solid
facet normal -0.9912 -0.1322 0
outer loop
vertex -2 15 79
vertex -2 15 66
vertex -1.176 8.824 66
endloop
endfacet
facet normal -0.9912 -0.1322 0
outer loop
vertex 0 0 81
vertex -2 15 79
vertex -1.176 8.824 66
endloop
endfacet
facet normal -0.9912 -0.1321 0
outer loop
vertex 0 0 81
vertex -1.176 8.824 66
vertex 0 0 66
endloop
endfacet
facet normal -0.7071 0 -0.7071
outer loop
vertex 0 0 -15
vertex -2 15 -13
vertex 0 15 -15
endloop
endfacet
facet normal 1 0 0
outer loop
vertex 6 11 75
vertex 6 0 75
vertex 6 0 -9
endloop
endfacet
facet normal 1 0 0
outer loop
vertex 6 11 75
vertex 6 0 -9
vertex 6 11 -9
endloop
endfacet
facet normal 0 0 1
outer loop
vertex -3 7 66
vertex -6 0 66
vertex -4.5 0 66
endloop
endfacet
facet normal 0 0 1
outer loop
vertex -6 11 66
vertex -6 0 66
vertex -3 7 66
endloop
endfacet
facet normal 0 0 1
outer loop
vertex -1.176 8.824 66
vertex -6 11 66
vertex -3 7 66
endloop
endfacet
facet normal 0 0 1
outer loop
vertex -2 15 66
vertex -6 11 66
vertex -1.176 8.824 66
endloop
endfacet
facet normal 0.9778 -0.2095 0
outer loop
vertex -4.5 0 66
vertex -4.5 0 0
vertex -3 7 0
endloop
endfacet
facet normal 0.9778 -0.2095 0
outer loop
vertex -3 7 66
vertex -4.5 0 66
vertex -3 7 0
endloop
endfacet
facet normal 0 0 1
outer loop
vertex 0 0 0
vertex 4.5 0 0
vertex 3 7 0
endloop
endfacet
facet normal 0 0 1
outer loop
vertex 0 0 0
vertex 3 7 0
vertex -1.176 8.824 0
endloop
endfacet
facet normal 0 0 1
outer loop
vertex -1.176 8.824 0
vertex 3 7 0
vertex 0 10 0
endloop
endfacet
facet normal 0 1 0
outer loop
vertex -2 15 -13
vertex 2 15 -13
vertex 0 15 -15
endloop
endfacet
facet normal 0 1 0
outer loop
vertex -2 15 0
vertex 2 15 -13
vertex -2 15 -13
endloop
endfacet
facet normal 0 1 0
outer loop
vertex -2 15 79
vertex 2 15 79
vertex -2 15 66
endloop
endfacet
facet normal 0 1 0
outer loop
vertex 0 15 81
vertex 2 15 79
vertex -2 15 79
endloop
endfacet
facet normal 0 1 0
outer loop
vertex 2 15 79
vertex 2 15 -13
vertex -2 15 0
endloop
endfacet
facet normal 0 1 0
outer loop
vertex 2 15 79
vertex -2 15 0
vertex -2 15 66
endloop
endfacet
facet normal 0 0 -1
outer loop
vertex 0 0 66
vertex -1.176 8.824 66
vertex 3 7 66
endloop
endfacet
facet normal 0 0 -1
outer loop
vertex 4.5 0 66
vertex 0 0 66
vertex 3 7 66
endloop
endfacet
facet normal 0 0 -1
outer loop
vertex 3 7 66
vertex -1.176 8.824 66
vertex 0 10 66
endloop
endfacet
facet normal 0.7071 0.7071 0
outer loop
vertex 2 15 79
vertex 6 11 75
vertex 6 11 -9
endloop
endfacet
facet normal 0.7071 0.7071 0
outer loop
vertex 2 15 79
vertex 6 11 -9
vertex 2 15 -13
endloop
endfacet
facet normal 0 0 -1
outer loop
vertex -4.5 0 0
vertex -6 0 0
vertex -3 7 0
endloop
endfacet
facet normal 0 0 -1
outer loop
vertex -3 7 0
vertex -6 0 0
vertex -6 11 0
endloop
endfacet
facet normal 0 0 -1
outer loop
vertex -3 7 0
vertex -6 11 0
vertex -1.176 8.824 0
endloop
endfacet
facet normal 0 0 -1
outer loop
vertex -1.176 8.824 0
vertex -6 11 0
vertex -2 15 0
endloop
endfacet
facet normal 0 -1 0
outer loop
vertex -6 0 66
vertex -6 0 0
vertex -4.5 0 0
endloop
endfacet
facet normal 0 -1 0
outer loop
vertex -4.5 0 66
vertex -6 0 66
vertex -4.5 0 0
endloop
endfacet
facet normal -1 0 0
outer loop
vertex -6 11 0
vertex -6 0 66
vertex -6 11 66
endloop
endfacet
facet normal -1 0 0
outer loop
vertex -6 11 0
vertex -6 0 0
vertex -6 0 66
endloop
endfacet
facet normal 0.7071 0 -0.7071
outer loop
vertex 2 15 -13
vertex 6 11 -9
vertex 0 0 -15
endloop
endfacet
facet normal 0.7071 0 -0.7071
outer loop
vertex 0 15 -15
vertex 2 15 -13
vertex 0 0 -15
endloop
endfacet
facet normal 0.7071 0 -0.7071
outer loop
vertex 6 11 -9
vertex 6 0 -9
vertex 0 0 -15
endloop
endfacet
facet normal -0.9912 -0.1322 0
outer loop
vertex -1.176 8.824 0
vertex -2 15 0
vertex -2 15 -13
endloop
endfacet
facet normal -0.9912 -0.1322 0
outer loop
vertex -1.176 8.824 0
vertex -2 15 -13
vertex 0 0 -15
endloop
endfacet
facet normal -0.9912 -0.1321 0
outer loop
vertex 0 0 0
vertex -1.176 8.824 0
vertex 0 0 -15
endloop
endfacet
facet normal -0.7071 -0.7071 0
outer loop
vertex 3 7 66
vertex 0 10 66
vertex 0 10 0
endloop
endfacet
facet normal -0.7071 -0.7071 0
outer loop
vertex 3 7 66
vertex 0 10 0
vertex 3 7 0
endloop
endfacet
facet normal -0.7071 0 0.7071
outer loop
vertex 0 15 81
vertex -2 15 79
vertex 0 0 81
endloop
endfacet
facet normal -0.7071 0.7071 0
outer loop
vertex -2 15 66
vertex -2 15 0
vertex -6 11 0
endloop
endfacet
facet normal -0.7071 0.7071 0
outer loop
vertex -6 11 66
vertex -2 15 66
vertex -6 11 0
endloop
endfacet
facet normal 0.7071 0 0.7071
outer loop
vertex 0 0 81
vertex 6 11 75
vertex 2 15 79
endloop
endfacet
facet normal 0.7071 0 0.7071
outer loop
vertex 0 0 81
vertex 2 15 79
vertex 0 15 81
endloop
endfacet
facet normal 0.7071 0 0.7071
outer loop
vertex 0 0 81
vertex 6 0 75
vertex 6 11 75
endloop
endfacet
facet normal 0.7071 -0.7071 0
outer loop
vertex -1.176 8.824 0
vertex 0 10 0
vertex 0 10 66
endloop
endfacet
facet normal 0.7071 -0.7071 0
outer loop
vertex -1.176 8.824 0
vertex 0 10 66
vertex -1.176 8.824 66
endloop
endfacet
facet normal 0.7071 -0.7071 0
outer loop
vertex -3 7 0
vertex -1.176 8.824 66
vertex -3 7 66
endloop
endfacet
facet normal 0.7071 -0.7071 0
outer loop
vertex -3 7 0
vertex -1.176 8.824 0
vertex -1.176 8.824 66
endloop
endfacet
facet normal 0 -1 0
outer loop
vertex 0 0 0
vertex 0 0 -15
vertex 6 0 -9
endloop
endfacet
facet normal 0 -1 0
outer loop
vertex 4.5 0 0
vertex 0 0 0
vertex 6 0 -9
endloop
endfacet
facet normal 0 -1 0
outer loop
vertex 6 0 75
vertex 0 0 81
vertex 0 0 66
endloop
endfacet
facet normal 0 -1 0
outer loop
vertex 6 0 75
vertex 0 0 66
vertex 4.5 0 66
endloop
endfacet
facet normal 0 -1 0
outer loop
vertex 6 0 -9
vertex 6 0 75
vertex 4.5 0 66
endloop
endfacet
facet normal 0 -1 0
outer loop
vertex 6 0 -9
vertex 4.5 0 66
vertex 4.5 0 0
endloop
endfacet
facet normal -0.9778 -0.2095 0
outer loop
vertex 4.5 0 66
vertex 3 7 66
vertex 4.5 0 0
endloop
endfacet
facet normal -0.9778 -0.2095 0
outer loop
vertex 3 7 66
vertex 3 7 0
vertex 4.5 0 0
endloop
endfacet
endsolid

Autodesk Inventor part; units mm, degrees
ref_plane "YZ Plane" through (0, 0, 0) normal (1, 0, 0) x (0, 1, 0)
ref_plane "XZ Plane" through (0, 0, 0) normal (0, 1, 0) x (-1, 0, 0)
ref_plane "XY Plane" through (0, 0, 0) normal (0, 0, 1) x (1, 0, 0)
sketch "Sketch1" plane through (0, 0, 0) normal (0, 0, 1) x (1, 0, 0)
  line L0 (6, 0) -> (6, 11)
  line L1 (0, 15) -> (2, 15)
  line L2 (2, 15) -> (6, 11)
  line L3 (0, 10) -> (3, 7)
  line L4 (-6, 0) -> (-6, 11)
  line L5 (0, 15) -> (-2, 15)
  line L6 (-2, 15) -> (-6, 11)
  line L7 (0, 10) -> (-3, 7)
  line L8 (-4.5, 0) -> (-3, 7)
  line L9 (3, 7) -> (4.5, 0)
  line L10 (-6, 0) -> (-4.5, 0)
  line L11 (4.5, 0) -> (6, 0)
  point P0 (0, 0)
  dimension "d2" = 11
  dimension "d4" = 2
  dimension "d5" = 10
extrude "Extrusion1" add sketch "Sketch1" along normal blind 66
sketch "Sketch2" plane through (0, 0, 66) normal (0, 0, 1) x (1, 0, 0)
  line L0 (2, 15) -> (-2, 15) projected
  line L1 (0, 15) -> (2, 15)
  line L2 (6, 11) -> (2, 15) projected
  line L3 (4.5, 0) -> (6, 0) projected
  line L4 (0, 0) -> (6, 0)
  line L5 (6, 0) -> (6, 11) projected
  line L6 (6, 0) -> (6, 11)
  line L7 (6, 11) -> (2, 15)
  line L8 (0, 15) -> (-2, 15)
  line L9 (-2, 15) -> (0, 0)
extrude "Extrusion2" add sketch "Sketch2" along normal blind 15
sketch "Sketch5" plane through (0, 0, 0) normal (0, 0, -1) x (-1, 0, 0)
  line L0 (0, 0) -> (-6, 0) projected
  line L1 (-6, 0) -> (-6, 11) projected
  line L2 (-6, 11) -> (-2, 15) projected
  line L3 (-2, 15) -> (2, 15) projected
  line L4 (2, 15) -> (0, 0) projected
extrude "Extrusion4" add sketch "Sketch5" along normal blind 15
sketch "Sketch6" plane through (0, 0, 66) normal (0, -1, 0) x (1, 0, 0)
  line L0 (0, -66) -> (0, -81) projected
  line L1 (6, -81) -> (6, 15) projected
  line L2 (0, -81) -> (6, -81)
  line L3 (6, -81) -> (6, -75)
  line L4 (6, -75) -> (0, -81)
  line L5 (-2, -81) -> (2, -81) projected
  line L6 (0, -81) -> (-2, -81)
  line L7 (-2, -81) -> (-2, -79)
  line L8 (-2, -66) -> (-2, -81) projected
  line L9 (-2, -79) -> (0, -81)
  line L10 (2, 15) -> (-2, 15) projected
  line L11 (6, 15) -> (2, 15) projected
  line L12 (0, 15) -> (6, 15)
  line L13 (6, 15) -> (6, 9)
  line L14 (0, 0) -> (0, 15) projected
  line L15 (6, 9) -> (0, 15)
  line L16 (0, 15) -> (-2, 15)
  line L17 (-2, 0) -> (-2, 15) projected
  line L18 (-2, 15) -> (-2, 13)
  line L19 (-2, 13) -> (0, 15)
  dimension "d16" = 6
  dimension "d17" = 2
  dimension "d18" = 6
extrude "Extrusion5" cut sketch "Sketch6" against normal blind 37.3875
properties part number "outside-join-2"
